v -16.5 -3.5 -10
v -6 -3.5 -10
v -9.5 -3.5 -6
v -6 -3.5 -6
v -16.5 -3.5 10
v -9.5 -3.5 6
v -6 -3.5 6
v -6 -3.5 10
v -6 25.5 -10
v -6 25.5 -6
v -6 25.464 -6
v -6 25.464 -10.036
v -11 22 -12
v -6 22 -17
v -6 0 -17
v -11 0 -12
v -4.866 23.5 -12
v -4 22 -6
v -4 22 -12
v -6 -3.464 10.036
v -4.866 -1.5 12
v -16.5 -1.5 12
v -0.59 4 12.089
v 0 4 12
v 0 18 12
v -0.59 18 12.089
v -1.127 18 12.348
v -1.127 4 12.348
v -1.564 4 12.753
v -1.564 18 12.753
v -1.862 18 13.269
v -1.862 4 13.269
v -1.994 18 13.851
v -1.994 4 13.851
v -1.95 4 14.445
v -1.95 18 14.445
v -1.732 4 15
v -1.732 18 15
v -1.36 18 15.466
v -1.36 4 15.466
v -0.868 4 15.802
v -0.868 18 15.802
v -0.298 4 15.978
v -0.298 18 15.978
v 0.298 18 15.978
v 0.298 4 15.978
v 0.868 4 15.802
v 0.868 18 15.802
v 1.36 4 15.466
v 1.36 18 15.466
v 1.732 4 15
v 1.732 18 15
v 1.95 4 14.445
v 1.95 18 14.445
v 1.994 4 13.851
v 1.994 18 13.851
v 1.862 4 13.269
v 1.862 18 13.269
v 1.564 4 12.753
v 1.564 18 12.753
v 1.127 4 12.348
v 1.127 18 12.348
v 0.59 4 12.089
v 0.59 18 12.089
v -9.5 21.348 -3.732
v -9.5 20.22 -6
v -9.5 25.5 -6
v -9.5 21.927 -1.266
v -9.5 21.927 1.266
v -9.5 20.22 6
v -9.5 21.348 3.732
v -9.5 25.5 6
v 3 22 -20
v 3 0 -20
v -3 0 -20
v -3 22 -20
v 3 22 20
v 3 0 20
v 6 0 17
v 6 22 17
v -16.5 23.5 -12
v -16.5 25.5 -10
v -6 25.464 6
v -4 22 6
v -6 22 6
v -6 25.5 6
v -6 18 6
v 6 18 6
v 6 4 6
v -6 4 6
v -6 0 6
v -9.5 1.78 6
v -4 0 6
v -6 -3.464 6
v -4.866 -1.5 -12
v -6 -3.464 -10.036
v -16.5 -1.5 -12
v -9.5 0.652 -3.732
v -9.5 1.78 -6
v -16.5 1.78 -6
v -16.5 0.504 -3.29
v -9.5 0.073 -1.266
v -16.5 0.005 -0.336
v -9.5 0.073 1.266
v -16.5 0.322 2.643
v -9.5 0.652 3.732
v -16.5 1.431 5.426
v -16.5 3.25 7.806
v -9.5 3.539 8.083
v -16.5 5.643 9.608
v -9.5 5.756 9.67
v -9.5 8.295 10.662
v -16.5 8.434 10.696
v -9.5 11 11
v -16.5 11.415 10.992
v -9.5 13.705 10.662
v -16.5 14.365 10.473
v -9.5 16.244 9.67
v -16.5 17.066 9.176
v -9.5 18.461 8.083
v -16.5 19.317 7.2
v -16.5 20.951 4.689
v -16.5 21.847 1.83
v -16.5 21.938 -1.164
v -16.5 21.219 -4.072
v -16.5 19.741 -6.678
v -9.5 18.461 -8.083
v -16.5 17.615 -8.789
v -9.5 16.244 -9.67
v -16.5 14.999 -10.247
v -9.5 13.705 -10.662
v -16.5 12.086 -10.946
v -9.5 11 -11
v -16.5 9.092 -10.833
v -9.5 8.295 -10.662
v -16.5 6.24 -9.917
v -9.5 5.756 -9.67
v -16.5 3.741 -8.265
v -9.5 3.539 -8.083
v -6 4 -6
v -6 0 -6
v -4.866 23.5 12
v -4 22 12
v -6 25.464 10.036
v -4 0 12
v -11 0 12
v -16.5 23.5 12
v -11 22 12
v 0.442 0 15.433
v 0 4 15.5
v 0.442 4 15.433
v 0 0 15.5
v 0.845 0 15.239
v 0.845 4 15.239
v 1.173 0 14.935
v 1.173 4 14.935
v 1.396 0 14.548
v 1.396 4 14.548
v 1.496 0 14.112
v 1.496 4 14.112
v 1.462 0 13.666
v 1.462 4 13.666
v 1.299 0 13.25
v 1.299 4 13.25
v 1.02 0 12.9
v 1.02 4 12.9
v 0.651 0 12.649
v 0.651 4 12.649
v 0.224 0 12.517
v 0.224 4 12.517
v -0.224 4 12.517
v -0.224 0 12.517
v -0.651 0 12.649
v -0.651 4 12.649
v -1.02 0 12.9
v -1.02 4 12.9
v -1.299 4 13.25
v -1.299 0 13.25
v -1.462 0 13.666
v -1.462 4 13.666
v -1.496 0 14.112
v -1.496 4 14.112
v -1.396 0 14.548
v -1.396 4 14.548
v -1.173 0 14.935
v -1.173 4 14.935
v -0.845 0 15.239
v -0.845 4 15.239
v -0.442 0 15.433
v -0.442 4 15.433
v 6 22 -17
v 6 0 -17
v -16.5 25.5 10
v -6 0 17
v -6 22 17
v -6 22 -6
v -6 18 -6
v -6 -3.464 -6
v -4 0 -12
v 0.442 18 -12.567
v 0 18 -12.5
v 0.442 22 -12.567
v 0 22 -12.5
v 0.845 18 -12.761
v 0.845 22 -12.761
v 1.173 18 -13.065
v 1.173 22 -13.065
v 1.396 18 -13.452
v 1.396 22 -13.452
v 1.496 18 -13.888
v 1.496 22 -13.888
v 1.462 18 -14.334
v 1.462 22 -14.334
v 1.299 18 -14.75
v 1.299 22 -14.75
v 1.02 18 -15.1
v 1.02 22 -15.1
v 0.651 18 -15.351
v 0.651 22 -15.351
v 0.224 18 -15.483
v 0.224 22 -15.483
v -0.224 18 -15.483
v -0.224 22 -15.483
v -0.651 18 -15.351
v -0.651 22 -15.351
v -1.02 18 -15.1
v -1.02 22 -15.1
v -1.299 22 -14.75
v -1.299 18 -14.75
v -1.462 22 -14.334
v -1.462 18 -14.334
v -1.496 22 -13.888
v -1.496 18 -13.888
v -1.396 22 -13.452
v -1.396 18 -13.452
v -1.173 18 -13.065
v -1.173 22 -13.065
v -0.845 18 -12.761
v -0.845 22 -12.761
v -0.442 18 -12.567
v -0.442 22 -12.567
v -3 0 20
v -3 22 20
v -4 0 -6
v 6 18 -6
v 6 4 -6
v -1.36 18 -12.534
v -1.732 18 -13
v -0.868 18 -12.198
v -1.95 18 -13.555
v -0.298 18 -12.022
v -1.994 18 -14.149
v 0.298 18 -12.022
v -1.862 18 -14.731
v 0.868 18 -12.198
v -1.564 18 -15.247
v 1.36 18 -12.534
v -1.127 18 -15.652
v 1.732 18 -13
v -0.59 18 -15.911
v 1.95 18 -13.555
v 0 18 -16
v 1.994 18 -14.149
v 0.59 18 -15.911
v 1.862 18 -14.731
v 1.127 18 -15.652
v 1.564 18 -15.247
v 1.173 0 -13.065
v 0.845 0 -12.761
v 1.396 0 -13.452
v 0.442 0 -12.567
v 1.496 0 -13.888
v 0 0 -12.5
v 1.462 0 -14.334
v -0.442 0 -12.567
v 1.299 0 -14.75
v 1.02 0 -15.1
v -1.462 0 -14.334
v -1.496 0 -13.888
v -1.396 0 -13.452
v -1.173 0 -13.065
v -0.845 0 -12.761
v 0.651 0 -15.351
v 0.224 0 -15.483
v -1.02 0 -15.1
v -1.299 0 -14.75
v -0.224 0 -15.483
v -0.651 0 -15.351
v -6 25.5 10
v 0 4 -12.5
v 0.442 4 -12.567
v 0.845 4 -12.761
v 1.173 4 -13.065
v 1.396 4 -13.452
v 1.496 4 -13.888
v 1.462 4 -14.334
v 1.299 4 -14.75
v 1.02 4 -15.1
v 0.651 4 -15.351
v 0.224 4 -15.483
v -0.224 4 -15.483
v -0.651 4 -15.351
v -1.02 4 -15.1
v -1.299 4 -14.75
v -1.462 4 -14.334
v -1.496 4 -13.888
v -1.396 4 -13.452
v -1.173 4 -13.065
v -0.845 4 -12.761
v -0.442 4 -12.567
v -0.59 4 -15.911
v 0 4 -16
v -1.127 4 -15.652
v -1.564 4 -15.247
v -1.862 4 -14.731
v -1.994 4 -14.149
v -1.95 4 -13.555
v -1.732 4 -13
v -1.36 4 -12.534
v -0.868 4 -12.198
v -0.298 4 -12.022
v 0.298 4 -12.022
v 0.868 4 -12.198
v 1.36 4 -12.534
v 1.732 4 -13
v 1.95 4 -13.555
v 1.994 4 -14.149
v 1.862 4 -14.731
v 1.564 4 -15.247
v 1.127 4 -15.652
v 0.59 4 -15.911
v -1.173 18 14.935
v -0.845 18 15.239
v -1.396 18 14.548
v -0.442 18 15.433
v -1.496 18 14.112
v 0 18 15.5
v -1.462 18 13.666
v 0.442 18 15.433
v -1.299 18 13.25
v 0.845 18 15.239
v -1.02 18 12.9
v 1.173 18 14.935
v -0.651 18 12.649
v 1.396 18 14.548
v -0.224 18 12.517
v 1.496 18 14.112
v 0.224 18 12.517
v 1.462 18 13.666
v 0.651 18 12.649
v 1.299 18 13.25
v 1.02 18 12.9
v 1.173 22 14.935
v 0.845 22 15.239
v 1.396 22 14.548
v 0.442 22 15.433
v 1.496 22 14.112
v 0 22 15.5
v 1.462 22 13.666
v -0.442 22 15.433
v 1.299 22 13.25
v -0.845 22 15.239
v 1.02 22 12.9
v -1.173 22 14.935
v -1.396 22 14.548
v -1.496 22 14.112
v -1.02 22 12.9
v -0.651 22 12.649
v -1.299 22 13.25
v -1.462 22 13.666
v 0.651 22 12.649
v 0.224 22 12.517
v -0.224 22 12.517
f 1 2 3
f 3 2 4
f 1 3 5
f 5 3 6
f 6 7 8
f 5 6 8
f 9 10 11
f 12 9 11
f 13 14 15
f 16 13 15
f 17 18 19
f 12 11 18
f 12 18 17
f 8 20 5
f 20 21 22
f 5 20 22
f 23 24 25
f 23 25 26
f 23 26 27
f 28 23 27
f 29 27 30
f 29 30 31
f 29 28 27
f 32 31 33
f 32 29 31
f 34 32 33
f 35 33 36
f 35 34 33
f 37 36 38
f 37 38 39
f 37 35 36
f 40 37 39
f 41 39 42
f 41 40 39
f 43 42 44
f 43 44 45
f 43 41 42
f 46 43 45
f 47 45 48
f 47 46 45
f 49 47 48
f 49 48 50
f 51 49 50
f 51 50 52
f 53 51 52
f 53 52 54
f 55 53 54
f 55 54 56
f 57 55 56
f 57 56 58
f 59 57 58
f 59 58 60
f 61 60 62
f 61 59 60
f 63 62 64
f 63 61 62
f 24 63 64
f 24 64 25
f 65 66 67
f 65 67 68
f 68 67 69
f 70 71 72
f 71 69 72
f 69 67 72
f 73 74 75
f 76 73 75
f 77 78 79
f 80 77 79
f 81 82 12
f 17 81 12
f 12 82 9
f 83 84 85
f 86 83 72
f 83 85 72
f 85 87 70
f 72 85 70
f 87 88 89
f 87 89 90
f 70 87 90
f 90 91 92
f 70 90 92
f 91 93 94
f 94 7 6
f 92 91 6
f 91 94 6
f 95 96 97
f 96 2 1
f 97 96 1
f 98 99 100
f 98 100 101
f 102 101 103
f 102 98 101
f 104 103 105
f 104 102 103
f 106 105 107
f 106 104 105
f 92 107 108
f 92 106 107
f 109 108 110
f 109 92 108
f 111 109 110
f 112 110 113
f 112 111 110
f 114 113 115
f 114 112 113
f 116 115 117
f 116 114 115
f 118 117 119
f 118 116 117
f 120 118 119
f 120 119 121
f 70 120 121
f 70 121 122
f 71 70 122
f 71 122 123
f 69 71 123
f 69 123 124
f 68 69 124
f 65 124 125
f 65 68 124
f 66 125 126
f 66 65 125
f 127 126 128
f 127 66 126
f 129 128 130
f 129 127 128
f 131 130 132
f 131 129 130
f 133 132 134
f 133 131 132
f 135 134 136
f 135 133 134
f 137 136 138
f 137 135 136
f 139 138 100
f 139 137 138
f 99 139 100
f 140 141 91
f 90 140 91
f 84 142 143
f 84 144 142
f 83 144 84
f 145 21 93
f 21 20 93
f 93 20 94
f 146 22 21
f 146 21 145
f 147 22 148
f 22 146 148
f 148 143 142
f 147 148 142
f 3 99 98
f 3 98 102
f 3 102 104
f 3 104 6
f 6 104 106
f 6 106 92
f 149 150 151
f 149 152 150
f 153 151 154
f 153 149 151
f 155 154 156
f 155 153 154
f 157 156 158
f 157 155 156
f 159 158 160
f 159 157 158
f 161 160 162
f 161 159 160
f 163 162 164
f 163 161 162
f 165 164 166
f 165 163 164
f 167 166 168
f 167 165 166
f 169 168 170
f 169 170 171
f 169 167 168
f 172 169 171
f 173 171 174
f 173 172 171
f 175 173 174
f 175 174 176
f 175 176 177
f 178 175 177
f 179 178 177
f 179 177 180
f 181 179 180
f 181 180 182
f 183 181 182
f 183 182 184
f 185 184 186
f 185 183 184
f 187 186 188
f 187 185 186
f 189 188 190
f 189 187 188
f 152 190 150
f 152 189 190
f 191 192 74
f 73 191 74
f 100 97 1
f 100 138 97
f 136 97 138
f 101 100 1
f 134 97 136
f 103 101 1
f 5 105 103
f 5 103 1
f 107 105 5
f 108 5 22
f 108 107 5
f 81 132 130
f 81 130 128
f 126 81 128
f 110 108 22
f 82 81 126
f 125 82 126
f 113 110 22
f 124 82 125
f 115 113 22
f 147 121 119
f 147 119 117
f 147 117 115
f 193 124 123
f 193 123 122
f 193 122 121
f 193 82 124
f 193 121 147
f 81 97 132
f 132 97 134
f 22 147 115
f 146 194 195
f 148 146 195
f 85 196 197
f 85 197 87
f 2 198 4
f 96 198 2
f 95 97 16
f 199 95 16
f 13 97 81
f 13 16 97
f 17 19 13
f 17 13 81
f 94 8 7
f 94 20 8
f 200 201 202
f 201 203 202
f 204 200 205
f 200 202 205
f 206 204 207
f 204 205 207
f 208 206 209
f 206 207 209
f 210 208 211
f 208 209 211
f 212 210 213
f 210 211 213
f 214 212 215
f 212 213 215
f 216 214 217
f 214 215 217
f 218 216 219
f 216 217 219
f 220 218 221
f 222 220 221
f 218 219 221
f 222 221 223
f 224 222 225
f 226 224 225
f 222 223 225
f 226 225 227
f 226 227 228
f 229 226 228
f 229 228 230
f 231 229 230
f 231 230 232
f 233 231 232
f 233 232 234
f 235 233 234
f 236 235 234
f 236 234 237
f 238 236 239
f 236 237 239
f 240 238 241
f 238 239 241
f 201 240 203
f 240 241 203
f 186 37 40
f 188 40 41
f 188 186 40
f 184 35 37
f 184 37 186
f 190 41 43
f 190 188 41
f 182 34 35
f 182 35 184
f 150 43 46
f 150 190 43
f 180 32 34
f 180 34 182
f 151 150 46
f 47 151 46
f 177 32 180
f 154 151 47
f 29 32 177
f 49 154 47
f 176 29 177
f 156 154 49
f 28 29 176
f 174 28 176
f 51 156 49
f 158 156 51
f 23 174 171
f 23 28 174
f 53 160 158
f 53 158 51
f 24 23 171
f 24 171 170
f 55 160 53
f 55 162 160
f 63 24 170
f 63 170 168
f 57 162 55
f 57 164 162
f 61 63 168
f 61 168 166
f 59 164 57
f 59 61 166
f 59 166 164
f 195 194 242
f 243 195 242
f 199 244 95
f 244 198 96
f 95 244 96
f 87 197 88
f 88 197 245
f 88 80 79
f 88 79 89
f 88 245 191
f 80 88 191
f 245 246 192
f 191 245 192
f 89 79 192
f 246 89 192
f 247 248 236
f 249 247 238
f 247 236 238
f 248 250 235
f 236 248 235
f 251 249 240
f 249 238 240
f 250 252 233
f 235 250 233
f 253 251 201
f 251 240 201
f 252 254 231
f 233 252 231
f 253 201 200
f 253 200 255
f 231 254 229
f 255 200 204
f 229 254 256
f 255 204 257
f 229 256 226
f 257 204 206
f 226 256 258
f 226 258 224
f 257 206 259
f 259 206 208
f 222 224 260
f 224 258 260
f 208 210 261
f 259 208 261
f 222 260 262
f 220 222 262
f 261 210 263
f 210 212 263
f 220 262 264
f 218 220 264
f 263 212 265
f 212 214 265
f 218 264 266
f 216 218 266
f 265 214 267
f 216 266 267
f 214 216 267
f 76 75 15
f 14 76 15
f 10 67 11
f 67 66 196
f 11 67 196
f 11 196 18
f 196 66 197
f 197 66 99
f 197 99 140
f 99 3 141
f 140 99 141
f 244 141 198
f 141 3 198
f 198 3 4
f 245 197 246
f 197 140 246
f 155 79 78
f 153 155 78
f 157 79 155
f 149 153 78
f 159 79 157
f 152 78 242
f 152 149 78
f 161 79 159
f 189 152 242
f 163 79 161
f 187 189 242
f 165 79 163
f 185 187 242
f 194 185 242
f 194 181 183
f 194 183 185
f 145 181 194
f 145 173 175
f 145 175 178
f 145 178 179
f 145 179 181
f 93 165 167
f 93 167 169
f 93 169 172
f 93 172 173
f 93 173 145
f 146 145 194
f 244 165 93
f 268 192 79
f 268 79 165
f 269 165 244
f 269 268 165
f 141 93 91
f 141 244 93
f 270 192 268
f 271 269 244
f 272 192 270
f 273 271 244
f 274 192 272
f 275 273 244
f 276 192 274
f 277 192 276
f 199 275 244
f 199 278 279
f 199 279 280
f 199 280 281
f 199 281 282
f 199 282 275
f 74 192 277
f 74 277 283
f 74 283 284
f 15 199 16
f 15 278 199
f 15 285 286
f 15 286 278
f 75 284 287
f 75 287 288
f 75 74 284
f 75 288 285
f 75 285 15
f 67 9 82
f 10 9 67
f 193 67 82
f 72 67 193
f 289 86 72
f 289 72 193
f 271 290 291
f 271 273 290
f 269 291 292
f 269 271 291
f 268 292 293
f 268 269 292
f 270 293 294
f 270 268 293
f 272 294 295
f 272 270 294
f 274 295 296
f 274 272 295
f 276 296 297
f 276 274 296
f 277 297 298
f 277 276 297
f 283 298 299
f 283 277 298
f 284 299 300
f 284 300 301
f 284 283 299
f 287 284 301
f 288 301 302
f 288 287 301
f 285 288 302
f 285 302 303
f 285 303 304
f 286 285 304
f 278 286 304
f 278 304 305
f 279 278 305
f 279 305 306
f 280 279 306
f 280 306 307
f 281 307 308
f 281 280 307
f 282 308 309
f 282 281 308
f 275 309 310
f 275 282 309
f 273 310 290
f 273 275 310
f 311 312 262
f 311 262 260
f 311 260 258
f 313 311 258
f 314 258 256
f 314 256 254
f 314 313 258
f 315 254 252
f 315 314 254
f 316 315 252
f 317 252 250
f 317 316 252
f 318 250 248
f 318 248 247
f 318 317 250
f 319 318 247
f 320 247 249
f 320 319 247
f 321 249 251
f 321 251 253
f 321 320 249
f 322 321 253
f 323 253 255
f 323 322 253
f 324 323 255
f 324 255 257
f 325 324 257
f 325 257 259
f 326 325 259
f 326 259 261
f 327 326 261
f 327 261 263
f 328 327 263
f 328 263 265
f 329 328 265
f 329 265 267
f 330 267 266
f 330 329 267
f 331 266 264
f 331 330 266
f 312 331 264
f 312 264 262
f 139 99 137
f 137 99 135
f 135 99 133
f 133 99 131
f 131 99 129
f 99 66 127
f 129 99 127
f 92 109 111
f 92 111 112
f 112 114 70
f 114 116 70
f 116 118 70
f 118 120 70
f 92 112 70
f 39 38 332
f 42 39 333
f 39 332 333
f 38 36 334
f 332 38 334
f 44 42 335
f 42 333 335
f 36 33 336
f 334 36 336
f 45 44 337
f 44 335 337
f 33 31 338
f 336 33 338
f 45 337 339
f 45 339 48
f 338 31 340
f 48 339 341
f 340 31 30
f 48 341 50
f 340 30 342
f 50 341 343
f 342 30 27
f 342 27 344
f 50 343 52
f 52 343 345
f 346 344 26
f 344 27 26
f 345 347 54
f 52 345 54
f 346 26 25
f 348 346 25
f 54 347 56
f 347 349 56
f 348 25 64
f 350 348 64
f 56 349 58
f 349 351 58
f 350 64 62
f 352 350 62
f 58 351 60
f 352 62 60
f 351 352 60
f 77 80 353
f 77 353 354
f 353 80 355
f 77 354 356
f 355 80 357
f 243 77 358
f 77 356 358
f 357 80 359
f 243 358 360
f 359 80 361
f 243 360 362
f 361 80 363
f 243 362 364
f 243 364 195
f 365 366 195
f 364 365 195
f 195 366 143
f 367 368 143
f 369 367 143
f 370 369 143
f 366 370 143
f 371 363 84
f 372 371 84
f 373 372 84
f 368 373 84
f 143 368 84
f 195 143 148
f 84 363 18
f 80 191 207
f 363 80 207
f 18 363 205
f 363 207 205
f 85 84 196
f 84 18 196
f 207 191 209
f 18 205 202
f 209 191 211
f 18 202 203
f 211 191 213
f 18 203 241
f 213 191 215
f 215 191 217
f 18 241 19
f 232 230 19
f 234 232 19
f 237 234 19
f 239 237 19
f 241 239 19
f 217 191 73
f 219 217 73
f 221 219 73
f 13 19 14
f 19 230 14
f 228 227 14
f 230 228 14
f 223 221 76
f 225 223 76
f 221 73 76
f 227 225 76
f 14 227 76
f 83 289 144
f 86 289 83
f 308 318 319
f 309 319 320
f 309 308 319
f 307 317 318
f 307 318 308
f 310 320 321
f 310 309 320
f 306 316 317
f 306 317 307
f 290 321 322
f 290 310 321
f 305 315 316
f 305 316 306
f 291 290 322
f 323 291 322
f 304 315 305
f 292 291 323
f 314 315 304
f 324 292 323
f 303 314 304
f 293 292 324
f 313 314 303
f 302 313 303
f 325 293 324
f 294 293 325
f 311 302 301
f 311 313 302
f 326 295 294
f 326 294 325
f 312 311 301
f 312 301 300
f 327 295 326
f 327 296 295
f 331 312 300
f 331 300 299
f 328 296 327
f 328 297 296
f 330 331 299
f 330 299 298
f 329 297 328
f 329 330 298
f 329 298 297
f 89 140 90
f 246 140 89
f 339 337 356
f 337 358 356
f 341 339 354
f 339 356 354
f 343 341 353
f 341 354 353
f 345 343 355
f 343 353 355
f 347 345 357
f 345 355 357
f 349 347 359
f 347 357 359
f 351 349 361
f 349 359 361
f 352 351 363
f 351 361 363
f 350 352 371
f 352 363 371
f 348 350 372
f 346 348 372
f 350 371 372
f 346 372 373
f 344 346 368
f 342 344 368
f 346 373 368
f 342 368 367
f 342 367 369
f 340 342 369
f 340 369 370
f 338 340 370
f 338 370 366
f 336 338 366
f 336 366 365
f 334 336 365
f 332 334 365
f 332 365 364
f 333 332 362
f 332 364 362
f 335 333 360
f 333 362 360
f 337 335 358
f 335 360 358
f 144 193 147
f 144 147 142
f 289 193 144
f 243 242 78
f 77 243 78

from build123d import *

# Parameters (mm, degrees)
SKETCH1_R           = 1.5
BOSS_EXTRUDE1_DEPTH = 3
BOSS_EXTRUDE2_START = 22.5
SKETCH2_W           = 3.5
SKETCH2_H           = 6
BOSS_EXTRUDE2_DEPTH = 29
SKETCH4_R           = 1.5
BOSS_EXTRUDE5_DEPTH = 1
CHAMFER2_SIZE       = 2
CHAMFER2_SIZE2      = 3.464101615
SKETCH3_W           = 24
SKETCH3_H           = 29
SKETCH3_R           = 11
BOSS_EXTRUDE4_DEPTH = 7
CHAMFER3_SIZE       = 2
SKETCH5_R           = 2
BOSS_EXTRUDE6_DEPTH = 14
CHAMFER5_SIZE       = 5


# Read off the part's stored shape, not the designer's step: Mirror1
with BuildPart() as part:
    # Sketch1 → Boss-Extrude1 (new body)
    with BuildSketch(Plane(origin=(0, 0, 0), x_dir=(1, 0, 0), z_dir=(0, 1, 0))):
        Polygon((-6, 17), (-3, 20), (3, 20), (6, 17), (6, -17), (3, -20), (-3, -20), (-6, -17), align=None)
        with Locations(Location((0, 14, 0), (0, 0, 270))):
            Circle(SKETCH1_R, mode=Mode.SUBTRACT)
        with Locations(Location((0, -14, 0), (0, 0, 270))):
            Circle(SKETCH1_R, mode=Mode.SUBTRACT)
    extrude(amount=BOSS_EXTRUDE1_DEPTH)

    # Sketch2 → Boss-Extrude2 (add)
    with BuildSketch(Plane(origin=(0, 3, 0), x_dir=(1, 0, 0), z_dir=(0, 1, 0)).offset(BOSS_EXTRUDE2_START)):
        with Locations((-7.75, 9)):
            Rectangle(SKETCH2_W, SKETCH2_H)
        with Locations((-7.75, -9)):
            Rectangle(SKETCH2_W, SKETCH2_H)
    extrude(amount=-BOSS_EXTRUDE2_DEPTH)

    # Sketch4 → Boss-Extrude5 (add)
    with BuildSketch(Plane(origin=(0, 3, 0), x_dir=(1, 0, 0), z_dir=(0, 1, 0))):
        Polygon((-3, 20), (-6, 17), (-6, 12), (-6, 6), (-6, -6), (-6, -12), (-6, -17), (-3, -20), (3, -20), (6, -17), (6, 17), (3, 20), align=None)
        with Locations(Location((0, 14, 0), (0, 0, 270))):
            Circle(SKETCH4_R, mode=Mode.SUBTRACT)
        with Locations(Location((0, -14, 0), (0, 0, 270))):
            Circle(SKETCH4_R, mode=Mode.SUBTRACT)
    extrude(amount=BOSS_EXTRUDE5_DEPTH)

    # Chamfer2
    chamfer2_edges = [part.edges().sort_by_distance(p)[0] for p in [
        (-6, 0, -9),
        (-6, 0, 9),
    ]]
    chamfer2_side = [part.faces().sort_by_distance(p)[0] for p in [
        (0, 0, 0),
    ]]
    chamfer(chamfer2_edges, length=CHAMFER2_SIZE, length2=CHAMFER2_SIZE2, reference=chamfer2_side[0])

    # Sketch3 → Boss-Extrude4 (add)
    with BuildSketch(Plane.ZY.offset(9.5)):
        with Locations((0, 11)):
            Rectangle(SKETCH3_W, SKETCH3_H)
        with Locations(Location((0, 11, 0), (0, 0, 236.944268849))):
            Circle(SKETCH3_R, mode=Mode.SUBTRACT)
    extrude(amount=BOSS_EXTRUDE4_DEPTH)

    # Chamfer3
    chamfer3_edges = [part.edges().sort_by_distance(p)[0] for p in [
        (-11.25, 25.5, -12),
        (-11.25, -3.5, -12),
        (-11.25, -3.5, 12),
        (-11.25, 25.5, 12),
    ]]
    chamfer(chamfer3_edges, length=CHAMFER3_SIZE)

    # Mirror1: part across plane


with BuildPart() as part_1:
    add(part.part)
    add(part.part.mirror(Plane(origin=(0, 11, 0), x_dir=(0, 0, 1), z_dir=(0, -1, 0))))

    # Sketch5 → Boss-Extrude6 (add)
    # profile 1 of 2: a face of its own
    with BuildSketch(Plane(origin=(0, 4, 0), x_dir=(1, 0, 0), z_dir=(0, 1, 0))):
        Polygon((6, -6), (-6, -6), (-6, -17), (-3, -20), (3, -20), (6, -17), align=None)
        with Locations(Location((0, -14, 0), (0, 0, 90))):
            Circle(SKETCH5_R, mode=Mode.SUBTRACT)
    # profile 2 of 2: a face of its own
    with BuildSketch(Plane(origin=(0, 4, 0), x_dir=(1, 0, 0), z_dir=(0, 1, 0))):
        Polygon((-6, 17), (-6, 6), (6, 6), (6, 17), (3, 20), (-3, 20), align=None)
        with Locations(Location((0, 14, 0), (0, 0, 90))):
            Circle(SKETCH5_R, mode=Mode.SUBTRACT)
    extrude(amount=BOSS_EXTRUDE6_DEPTH)

    # Chamfer5
    chamfer5_edges = [part_1.edges().sort_by_distance(p)[0] for p in [
        (-6, 11, 12),
        (-6, 11, -12),
    ]]
    chamfer(chamfer5_edges, length=CHAMFER5_SIZE - 0.0001)  # a hair under: the kernel refuses the full size


solid = part_1.part
